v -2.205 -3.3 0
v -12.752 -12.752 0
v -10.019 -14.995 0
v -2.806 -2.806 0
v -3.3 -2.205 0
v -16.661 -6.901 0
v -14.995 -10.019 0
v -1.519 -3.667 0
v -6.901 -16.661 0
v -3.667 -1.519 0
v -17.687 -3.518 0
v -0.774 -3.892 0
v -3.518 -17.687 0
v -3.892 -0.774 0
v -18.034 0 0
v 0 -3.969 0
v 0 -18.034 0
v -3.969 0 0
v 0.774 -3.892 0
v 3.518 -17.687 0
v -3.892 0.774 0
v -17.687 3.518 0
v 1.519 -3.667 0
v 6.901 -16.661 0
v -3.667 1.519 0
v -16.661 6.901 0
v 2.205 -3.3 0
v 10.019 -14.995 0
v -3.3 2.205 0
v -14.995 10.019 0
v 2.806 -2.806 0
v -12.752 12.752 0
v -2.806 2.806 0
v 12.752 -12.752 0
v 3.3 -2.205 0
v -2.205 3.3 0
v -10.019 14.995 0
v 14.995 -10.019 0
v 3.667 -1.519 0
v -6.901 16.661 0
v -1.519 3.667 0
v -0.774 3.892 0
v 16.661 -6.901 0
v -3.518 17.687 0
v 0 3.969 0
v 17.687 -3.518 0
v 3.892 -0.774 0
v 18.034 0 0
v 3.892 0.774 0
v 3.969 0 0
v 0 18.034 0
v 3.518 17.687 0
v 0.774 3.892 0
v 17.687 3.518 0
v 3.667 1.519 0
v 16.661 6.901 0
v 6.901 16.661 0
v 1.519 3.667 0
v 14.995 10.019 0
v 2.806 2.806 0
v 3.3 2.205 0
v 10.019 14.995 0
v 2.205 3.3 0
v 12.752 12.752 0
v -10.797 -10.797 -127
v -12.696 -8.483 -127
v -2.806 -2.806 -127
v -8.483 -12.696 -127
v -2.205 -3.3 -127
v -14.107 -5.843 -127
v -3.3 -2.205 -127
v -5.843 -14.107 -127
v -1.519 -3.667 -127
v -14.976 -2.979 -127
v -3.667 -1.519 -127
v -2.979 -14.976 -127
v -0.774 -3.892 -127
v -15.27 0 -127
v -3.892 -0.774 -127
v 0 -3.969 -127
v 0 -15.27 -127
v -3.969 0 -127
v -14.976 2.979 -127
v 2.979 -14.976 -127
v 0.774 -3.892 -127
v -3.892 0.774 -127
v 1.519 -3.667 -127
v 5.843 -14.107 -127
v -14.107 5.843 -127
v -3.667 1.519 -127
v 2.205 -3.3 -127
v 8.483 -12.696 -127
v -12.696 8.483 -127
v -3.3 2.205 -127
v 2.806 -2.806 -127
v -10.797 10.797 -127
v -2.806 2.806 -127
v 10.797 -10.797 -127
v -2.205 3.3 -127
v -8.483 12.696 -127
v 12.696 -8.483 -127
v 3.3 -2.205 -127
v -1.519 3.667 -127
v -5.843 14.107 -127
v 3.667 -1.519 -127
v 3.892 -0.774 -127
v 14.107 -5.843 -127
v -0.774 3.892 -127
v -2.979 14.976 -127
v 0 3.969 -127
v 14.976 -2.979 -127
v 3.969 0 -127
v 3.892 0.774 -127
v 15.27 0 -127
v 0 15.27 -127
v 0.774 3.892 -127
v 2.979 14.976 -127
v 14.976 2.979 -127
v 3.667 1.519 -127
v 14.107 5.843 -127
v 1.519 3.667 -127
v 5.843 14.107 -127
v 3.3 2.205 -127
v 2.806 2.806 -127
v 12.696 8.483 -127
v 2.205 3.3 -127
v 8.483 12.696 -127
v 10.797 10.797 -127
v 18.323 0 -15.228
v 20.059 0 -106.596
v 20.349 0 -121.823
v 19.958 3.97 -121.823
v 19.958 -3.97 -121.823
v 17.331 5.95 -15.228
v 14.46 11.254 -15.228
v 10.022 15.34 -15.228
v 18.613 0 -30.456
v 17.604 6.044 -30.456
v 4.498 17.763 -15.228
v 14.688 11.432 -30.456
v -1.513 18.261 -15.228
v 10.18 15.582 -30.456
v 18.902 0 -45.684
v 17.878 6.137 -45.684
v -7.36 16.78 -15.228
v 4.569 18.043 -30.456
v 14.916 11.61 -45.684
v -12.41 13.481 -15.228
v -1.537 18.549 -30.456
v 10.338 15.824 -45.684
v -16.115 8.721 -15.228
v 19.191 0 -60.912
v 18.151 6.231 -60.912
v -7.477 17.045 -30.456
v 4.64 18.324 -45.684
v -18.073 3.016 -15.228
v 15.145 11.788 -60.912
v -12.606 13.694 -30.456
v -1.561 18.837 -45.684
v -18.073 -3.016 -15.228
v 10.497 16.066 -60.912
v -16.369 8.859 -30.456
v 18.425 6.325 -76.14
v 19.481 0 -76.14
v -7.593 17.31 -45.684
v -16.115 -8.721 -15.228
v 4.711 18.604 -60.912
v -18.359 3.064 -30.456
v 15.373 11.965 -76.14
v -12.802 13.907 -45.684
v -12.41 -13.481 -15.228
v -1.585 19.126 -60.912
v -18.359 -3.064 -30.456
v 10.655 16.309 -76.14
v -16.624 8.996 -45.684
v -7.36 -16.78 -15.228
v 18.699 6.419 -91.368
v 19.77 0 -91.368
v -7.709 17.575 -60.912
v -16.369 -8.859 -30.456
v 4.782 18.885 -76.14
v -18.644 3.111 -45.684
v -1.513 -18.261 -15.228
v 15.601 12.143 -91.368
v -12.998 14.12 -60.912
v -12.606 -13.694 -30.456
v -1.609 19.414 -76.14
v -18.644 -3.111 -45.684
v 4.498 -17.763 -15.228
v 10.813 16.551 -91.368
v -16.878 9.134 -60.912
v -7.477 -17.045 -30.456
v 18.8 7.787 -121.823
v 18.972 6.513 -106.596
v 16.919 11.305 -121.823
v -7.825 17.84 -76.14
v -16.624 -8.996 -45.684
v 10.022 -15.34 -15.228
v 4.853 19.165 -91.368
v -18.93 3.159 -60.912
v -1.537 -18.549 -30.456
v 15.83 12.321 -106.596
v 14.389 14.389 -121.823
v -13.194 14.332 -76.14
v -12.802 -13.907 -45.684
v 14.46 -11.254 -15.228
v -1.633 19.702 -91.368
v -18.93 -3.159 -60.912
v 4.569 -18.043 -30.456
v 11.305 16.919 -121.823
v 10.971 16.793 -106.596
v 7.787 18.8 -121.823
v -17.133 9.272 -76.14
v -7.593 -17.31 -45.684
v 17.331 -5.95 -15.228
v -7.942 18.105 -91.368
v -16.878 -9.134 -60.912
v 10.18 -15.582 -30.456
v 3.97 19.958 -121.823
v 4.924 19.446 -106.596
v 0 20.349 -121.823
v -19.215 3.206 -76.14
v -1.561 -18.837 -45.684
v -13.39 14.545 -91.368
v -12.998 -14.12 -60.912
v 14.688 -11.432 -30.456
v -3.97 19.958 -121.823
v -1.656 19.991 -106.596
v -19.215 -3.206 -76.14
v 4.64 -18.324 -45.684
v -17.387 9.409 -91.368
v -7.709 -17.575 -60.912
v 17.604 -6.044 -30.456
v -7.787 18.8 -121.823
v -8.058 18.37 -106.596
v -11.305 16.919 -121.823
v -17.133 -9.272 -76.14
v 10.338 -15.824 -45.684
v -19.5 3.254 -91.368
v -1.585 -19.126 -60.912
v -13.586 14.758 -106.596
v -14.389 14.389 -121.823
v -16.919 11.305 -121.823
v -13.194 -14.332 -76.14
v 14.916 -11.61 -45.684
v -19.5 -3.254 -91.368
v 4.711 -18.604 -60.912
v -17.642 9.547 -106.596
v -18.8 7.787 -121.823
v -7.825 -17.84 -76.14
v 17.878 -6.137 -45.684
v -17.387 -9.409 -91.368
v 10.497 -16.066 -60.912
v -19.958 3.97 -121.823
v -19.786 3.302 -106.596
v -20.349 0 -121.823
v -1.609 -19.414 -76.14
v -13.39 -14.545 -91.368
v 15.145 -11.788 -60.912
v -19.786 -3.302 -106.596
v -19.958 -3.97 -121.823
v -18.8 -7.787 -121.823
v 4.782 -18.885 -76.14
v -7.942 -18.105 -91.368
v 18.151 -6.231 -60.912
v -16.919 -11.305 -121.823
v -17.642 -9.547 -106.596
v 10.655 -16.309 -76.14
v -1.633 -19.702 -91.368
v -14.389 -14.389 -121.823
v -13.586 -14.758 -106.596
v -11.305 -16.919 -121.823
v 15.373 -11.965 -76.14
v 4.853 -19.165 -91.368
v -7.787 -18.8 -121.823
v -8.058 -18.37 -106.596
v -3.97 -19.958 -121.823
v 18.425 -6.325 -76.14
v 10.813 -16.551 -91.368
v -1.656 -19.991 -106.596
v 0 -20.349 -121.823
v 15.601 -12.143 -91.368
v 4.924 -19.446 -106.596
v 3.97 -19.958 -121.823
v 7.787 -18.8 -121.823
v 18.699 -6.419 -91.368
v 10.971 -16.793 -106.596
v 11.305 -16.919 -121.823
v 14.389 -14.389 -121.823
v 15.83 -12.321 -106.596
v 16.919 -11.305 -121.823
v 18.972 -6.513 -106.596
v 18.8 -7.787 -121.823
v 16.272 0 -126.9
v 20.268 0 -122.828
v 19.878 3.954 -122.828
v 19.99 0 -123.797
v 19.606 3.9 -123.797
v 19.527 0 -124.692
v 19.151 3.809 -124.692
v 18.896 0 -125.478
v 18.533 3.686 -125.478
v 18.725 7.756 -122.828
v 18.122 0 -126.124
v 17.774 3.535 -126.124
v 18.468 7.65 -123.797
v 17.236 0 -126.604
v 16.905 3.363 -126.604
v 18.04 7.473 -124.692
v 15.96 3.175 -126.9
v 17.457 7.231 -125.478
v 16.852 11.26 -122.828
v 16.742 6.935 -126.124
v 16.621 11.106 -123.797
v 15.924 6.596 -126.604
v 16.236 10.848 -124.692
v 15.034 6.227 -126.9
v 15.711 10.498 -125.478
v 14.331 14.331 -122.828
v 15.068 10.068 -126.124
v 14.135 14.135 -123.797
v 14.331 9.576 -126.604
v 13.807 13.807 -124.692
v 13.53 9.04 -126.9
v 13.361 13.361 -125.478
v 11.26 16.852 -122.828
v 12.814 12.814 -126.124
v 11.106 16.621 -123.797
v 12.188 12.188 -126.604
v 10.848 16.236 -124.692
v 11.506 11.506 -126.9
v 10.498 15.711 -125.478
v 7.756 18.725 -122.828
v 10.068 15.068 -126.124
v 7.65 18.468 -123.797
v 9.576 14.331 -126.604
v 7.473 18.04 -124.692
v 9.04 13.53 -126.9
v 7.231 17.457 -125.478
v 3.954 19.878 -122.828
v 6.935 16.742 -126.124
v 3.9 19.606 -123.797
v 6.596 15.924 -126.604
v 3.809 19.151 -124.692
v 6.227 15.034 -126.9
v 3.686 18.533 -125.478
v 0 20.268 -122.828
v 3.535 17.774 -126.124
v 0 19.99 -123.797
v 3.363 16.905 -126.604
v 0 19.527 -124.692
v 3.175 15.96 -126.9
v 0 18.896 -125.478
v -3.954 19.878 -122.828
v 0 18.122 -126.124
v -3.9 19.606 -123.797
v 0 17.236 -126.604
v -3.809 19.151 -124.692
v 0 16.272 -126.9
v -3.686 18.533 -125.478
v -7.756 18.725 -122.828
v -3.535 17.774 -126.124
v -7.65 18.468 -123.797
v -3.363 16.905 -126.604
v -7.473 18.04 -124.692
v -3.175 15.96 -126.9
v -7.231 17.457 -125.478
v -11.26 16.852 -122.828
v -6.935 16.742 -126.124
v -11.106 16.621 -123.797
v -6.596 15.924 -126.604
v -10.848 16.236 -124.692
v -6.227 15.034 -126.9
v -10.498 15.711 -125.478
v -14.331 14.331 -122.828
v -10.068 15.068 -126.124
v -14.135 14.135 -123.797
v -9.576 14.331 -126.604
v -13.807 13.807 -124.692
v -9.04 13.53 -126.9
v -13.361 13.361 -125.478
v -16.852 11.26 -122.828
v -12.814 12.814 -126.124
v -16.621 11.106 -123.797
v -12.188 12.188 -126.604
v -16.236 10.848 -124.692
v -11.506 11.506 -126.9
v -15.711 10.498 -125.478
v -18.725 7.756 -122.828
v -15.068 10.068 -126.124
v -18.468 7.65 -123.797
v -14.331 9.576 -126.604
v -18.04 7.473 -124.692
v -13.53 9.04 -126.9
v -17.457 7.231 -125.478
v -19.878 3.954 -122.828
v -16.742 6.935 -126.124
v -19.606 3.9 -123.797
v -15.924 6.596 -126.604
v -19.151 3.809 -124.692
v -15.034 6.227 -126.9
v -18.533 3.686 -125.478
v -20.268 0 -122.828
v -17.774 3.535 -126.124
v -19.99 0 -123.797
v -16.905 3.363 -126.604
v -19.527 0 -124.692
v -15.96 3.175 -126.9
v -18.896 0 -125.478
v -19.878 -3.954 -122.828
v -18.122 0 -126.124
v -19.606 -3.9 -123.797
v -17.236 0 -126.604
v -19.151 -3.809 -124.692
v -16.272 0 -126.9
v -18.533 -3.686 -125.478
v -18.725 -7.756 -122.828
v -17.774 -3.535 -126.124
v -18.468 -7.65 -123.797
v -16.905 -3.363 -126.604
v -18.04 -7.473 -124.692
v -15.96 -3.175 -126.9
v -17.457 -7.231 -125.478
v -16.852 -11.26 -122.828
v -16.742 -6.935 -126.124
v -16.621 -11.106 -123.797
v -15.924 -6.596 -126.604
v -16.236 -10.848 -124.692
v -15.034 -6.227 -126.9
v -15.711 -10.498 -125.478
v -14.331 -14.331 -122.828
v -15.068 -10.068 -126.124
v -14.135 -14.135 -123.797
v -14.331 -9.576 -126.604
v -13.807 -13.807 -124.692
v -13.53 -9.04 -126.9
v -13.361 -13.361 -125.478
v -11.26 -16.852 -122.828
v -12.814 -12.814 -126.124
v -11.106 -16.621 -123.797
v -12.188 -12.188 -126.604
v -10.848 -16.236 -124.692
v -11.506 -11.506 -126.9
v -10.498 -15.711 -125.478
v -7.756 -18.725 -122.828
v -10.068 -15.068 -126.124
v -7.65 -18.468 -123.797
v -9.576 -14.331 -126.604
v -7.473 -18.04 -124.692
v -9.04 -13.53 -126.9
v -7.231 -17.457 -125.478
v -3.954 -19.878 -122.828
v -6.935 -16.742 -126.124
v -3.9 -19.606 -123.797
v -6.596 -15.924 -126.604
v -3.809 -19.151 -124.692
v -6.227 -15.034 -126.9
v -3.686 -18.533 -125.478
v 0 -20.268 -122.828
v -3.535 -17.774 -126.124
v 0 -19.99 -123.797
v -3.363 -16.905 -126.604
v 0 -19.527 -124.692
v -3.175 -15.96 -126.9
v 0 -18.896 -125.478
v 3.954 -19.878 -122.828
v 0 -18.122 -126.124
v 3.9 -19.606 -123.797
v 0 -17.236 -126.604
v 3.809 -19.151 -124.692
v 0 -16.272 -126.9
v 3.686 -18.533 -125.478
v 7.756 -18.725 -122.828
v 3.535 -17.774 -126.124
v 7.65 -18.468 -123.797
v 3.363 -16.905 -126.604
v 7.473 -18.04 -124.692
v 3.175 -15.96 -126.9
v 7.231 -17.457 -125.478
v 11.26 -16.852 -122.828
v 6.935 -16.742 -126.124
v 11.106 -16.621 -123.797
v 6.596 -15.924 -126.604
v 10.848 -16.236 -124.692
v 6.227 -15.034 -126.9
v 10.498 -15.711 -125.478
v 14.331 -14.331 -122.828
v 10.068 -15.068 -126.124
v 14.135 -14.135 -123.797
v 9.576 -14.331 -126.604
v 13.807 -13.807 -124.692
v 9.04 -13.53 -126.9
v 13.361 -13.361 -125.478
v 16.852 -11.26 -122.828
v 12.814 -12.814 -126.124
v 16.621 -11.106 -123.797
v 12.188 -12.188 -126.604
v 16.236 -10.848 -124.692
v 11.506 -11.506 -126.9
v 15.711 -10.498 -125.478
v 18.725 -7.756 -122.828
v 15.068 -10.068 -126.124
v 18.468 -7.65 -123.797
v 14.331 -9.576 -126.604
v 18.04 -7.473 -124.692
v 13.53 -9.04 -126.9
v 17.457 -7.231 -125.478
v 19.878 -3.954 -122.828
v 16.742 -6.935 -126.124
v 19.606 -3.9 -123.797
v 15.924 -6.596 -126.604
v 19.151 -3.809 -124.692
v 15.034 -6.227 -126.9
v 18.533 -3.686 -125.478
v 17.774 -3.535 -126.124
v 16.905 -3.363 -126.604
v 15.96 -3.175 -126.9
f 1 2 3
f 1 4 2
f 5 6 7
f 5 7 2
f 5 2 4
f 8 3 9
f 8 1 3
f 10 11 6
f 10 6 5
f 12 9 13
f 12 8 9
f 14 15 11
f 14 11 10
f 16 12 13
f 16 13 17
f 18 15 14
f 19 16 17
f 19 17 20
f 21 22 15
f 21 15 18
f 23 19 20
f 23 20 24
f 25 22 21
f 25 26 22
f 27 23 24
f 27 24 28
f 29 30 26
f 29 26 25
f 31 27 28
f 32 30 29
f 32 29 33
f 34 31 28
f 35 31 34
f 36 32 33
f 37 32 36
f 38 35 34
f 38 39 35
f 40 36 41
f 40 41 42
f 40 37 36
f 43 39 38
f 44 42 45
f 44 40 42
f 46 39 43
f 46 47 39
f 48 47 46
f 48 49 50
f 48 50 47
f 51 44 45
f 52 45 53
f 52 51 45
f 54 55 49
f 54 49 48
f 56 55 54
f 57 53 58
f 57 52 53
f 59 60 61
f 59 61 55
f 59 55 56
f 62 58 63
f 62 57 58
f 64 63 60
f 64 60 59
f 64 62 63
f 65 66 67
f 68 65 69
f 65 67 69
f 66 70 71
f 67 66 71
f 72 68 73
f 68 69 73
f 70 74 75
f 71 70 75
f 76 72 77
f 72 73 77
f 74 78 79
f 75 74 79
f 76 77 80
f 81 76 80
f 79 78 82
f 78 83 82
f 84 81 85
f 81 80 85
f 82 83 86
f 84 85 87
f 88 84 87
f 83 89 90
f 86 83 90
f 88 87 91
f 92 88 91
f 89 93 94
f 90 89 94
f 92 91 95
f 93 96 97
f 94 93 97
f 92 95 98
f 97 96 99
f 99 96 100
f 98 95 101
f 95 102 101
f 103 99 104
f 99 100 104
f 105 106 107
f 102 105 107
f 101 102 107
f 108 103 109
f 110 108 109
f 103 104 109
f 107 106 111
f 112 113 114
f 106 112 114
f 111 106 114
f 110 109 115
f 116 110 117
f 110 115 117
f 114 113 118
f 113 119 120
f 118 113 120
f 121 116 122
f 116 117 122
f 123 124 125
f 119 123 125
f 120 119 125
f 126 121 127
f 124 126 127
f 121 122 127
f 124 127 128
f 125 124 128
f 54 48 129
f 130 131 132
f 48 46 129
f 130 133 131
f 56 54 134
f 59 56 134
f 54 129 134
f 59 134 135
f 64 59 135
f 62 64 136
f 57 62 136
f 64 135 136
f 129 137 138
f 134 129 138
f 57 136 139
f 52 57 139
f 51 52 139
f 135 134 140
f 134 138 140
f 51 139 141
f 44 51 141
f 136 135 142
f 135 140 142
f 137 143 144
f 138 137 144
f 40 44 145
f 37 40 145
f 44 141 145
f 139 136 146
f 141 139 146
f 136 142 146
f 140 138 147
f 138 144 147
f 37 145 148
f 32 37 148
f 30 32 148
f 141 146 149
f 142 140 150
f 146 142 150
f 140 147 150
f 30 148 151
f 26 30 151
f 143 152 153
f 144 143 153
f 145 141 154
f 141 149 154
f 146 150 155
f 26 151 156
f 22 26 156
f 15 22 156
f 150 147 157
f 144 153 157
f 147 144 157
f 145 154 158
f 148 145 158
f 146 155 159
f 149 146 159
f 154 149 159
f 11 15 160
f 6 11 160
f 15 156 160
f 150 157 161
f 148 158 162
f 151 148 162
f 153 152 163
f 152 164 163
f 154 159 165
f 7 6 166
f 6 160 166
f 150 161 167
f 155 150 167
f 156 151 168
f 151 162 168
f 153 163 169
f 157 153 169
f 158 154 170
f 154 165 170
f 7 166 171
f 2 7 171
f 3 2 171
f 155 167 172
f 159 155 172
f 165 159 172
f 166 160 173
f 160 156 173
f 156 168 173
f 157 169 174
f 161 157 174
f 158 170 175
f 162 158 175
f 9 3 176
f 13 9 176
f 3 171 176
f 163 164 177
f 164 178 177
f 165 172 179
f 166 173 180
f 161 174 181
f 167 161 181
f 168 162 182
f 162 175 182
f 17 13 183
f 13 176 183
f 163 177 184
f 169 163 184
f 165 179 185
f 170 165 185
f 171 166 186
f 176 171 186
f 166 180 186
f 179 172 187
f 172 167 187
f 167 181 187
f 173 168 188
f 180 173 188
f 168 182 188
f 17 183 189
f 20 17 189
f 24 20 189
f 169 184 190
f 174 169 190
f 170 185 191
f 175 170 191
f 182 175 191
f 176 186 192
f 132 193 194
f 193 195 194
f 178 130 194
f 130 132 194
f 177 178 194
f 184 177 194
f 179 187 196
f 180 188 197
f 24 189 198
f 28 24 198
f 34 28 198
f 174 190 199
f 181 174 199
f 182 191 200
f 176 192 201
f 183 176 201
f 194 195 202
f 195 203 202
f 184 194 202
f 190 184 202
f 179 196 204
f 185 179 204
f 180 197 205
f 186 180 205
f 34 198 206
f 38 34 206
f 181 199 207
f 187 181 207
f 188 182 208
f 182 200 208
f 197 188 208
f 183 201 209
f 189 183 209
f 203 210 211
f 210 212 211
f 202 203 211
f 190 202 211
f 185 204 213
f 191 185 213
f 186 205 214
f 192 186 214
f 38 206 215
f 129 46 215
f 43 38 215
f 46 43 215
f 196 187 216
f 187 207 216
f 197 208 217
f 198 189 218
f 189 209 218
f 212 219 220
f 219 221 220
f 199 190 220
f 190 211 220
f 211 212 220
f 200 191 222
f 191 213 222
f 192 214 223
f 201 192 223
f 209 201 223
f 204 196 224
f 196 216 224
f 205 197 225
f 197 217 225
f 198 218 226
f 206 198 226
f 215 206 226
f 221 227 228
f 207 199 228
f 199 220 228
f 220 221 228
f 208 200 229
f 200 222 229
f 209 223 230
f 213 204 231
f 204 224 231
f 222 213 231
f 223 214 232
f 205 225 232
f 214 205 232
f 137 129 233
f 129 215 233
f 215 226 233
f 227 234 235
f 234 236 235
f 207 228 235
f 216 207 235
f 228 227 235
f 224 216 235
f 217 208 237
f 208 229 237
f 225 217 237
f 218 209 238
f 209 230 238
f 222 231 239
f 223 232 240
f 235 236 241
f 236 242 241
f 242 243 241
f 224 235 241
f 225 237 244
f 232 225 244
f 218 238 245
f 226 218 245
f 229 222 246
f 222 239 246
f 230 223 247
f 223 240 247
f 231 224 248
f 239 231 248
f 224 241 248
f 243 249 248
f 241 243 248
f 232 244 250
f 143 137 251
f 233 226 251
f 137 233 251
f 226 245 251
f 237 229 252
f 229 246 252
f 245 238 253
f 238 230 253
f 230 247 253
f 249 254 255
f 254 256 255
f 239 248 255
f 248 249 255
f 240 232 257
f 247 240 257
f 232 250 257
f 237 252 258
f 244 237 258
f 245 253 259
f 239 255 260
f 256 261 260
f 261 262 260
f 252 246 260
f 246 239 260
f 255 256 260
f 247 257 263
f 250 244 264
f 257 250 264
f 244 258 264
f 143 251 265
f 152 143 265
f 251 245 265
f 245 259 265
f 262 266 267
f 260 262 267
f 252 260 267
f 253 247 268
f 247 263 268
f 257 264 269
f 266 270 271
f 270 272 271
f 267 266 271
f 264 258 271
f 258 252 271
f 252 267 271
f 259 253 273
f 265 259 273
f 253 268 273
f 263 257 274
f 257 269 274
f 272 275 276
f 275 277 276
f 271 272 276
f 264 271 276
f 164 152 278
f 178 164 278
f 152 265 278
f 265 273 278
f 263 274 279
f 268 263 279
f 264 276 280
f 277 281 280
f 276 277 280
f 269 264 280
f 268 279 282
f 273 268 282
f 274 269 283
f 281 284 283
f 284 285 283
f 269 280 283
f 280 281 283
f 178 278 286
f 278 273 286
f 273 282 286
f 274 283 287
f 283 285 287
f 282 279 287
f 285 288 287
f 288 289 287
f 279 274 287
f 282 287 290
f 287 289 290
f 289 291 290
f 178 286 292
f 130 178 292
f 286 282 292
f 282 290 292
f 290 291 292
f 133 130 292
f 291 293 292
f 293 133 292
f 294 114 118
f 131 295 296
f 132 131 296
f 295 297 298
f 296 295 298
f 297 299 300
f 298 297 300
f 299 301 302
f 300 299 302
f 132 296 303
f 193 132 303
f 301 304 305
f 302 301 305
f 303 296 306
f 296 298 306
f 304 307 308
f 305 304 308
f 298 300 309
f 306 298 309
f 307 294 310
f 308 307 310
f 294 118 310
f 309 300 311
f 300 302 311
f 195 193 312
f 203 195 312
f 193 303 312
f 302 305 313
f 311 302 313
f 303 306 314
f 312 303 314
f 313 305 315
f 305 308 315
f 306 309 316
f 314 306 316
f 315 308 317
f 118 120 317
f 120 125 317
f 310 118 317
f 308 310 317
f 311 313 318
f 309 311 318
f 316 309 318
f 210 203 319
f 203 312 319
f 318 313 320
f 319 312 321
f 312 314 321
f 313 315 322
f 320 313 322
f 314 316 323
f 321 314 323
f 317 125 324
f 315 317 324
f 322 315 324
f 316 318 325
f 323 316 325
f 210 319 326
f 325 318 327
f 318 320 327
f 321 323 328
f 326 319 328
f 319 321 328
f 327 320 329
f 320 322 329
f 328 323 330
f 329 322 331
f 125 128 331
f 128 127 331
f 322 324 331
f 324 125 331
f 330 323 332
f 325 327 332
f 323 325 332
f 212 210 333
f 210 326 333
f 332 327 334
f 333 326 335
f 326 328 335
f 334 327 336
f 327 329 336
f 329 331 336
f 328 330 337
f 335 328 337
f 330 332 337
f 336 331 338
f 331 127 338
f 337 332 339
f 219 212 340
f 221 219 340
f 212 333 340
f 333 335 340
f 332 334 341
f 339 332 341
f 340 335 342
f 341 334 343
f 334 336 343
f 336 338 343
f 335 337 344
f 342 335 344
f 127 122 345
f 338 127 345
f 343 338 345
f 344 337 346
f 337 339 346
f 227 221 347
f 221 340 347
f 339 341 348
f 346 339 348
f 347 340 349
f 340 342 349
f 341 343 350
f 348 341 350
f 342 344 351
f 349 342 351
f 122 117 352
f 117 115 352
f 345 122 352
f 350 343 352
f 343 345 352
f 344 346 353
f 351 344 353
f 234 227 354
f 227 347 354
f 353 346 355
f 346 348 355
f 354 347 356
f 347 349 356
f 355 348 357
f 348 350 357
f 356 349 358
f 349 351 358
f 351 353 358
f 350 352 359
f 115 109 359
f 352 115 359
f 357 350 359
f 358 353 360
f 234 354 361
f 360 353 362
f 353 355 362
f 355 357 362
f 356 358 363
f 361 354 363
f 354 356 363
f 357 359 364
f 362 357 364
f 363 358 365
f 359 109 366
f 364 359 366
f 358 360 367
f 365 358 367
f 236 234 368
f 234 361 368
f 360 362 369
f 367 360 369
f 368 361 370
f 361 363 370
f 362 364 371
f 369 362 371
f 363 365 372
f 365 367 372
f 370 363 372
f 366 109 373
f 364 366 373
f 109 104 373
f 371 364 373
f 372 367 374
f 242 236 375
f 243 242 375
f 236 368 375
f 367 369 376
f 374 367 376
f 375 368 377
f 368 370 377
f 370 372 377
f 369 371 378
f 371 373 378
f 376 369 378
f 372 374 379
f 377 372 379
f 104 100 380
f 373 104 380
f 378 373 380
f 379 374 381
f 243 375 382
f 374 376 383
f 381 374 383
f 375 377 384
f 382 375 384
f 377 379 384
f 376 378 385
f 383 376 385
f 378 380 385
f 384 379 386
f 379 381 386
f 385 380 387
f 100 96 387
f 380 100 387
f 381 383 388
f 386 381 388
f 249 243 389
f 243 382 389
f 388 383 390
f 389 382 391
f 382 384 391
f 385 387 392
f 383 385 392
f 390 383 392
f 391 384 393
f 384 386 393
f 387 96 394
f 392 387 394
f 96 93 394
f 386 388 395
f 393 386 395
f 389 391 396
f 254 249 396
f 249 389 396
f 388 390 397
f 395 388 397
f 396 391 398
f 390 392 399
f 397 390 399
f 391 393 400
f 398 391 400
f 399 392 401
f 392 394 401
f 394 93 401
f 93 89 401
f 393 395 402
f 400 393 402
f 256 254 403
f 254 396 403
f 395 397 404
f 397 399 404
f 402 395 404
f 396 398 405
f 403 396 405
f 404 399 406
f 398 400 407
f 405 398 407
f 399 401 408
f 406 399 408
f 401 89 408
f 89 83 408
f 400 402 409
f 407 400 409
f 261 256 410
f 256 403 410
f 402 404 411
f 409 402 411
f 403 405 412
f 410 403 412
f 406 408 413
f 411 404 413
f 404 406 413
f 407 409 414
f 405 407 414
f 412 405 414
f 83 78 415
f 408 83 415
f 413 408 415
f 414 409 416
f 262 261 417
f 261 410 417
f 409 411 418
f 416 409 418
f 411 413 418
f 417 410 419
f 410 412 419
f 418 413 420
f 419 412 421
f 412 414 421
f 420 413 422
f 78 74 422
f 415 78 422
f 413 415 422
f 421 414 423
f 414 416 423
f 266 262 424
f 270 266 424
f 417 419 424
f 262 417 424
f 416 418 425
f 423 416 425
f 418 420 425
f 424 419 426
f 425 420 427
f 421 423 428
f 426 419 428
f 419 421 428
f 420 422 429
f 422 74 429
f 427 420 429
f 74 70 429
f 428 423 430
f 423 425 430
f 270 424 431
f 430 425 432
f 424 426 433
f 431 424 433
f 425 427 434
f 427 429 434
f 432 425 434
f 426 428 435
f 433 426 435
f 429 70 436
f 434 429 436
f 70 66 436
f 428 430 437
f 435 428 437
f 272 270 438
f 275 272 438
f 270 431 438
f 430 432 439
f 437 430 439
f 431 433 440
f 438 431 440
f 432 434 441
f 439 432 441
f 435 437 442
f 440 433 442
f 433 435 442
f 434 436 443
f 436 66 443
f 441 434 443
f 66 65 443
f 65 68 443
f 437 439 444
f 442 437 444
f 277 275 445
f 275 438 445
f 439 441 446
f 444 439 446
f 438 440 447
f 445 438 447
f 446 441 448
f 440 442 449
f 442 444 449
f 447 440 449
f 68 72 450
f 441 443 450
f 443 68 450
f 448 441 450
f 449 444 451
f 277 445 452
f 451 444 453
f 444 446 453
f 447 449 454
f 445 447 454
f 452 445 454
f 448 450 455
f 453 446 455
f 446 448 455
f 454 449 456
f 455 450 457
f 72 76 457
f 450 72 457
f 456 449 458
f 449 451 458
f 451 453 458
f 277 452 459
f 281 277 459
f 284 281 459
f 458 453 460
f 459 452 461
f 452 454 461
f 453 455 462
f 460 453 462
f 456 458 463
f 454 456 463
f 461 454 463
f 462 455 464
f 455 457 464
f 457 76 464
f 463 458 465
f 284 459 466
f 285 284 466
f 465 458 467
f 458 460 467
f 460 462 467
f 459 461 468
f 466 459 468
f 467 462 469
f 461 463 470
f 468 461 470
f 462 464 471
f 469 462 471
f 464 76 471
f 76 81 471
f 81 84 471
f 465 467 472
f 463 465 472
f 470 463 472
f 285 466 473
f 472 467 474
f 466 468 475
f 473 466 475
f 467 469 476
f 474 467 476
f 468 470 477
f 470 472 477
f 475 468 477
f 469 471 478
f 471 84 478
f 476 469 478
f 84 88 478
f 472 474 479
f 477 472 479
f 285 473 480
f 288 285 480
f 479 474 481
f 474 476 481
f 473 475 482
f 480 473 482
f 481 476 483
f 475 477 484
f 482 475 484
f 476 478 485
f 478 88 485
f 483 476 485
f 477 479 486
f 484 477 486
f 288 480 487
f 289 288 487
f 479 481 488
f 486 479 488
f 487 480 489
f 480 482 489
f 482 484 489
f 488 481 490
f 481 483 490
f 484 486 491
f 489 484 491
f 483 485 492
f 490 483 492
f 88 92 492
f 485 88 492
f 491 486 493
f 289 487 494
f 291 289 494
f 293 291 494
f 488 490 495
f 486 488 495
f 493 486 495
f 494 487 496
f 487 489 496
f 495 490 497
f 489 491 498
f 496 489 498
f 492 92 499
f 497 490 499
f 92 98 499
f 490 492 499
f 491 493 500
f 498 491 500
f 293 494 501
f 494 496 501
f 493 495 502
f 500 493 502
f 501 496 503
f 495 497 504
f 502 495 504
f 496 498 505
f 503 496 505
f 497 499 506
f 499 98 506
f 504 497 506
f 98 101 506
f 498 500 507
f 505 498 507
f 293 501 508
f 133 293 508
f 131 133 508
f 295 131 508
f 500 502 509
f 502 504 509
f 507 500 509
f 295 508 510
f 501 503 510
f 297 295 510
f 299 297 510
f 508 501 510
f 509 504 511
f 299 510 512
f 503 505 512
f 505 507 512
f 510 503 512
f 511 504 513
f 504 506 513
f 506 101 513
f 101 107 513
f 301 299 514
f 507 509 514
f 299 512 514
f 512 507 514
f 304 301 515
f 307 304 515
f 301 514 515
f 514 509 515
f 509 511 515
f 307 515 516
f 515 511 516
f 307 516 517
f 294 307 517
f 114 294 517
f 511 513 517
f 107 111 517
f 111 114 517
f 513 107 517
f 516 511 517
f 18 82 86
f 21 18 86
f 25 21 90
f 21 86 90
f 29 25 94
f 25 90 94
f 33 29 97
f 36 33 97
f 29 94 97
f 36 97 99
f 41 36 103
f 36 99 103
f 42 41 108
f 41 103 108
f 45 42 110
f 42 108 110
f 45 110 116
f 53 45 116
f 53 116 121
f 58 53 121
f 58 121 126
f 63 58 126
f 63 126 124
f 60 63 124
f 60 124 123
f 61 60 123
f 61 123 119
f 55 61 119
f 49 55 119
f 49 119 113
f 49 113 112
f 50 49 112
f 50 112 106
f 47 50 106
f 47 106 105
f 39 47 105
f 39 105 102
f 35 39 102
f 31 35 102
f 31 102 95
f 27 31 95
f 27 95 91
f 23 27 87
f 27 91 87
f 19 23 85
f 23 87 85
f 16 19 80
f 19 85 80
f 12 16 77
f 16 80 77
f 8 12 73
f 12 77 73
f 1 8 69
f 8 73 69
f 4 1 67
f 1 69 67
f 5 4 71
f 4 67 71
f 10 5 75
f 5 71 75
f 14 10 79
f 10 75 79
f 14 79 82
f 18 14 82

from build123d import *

# Parameters (mm, degrees)
F0_R = 18.034
F2_R = 20.447
F4_R = 5.08
F6_D = 7.9375


with BuildPart() as f3:
    # F0 (on Top) → F3 section 0
    with BuildSketch(Plane.XY):
        Circle(F0_R)
    # F2 (on offset) → F3 section 1
    with BuildSketch(Plane.XY.offset(-127)):
        Circle(F2_R)
    loft()

    # F4
    f4_edges = [f3.edges().sort_by_distance(p)[0] for p in [
        (-20.447, 0, -127),
    ]]
    fillet(f4_edges, radius=F4_R)

    # F6 (through all)
    with Locations(Plane.XY):
        with Locations((0, 0)):
            Hole(F6_D / 2)


solid = f3.part
